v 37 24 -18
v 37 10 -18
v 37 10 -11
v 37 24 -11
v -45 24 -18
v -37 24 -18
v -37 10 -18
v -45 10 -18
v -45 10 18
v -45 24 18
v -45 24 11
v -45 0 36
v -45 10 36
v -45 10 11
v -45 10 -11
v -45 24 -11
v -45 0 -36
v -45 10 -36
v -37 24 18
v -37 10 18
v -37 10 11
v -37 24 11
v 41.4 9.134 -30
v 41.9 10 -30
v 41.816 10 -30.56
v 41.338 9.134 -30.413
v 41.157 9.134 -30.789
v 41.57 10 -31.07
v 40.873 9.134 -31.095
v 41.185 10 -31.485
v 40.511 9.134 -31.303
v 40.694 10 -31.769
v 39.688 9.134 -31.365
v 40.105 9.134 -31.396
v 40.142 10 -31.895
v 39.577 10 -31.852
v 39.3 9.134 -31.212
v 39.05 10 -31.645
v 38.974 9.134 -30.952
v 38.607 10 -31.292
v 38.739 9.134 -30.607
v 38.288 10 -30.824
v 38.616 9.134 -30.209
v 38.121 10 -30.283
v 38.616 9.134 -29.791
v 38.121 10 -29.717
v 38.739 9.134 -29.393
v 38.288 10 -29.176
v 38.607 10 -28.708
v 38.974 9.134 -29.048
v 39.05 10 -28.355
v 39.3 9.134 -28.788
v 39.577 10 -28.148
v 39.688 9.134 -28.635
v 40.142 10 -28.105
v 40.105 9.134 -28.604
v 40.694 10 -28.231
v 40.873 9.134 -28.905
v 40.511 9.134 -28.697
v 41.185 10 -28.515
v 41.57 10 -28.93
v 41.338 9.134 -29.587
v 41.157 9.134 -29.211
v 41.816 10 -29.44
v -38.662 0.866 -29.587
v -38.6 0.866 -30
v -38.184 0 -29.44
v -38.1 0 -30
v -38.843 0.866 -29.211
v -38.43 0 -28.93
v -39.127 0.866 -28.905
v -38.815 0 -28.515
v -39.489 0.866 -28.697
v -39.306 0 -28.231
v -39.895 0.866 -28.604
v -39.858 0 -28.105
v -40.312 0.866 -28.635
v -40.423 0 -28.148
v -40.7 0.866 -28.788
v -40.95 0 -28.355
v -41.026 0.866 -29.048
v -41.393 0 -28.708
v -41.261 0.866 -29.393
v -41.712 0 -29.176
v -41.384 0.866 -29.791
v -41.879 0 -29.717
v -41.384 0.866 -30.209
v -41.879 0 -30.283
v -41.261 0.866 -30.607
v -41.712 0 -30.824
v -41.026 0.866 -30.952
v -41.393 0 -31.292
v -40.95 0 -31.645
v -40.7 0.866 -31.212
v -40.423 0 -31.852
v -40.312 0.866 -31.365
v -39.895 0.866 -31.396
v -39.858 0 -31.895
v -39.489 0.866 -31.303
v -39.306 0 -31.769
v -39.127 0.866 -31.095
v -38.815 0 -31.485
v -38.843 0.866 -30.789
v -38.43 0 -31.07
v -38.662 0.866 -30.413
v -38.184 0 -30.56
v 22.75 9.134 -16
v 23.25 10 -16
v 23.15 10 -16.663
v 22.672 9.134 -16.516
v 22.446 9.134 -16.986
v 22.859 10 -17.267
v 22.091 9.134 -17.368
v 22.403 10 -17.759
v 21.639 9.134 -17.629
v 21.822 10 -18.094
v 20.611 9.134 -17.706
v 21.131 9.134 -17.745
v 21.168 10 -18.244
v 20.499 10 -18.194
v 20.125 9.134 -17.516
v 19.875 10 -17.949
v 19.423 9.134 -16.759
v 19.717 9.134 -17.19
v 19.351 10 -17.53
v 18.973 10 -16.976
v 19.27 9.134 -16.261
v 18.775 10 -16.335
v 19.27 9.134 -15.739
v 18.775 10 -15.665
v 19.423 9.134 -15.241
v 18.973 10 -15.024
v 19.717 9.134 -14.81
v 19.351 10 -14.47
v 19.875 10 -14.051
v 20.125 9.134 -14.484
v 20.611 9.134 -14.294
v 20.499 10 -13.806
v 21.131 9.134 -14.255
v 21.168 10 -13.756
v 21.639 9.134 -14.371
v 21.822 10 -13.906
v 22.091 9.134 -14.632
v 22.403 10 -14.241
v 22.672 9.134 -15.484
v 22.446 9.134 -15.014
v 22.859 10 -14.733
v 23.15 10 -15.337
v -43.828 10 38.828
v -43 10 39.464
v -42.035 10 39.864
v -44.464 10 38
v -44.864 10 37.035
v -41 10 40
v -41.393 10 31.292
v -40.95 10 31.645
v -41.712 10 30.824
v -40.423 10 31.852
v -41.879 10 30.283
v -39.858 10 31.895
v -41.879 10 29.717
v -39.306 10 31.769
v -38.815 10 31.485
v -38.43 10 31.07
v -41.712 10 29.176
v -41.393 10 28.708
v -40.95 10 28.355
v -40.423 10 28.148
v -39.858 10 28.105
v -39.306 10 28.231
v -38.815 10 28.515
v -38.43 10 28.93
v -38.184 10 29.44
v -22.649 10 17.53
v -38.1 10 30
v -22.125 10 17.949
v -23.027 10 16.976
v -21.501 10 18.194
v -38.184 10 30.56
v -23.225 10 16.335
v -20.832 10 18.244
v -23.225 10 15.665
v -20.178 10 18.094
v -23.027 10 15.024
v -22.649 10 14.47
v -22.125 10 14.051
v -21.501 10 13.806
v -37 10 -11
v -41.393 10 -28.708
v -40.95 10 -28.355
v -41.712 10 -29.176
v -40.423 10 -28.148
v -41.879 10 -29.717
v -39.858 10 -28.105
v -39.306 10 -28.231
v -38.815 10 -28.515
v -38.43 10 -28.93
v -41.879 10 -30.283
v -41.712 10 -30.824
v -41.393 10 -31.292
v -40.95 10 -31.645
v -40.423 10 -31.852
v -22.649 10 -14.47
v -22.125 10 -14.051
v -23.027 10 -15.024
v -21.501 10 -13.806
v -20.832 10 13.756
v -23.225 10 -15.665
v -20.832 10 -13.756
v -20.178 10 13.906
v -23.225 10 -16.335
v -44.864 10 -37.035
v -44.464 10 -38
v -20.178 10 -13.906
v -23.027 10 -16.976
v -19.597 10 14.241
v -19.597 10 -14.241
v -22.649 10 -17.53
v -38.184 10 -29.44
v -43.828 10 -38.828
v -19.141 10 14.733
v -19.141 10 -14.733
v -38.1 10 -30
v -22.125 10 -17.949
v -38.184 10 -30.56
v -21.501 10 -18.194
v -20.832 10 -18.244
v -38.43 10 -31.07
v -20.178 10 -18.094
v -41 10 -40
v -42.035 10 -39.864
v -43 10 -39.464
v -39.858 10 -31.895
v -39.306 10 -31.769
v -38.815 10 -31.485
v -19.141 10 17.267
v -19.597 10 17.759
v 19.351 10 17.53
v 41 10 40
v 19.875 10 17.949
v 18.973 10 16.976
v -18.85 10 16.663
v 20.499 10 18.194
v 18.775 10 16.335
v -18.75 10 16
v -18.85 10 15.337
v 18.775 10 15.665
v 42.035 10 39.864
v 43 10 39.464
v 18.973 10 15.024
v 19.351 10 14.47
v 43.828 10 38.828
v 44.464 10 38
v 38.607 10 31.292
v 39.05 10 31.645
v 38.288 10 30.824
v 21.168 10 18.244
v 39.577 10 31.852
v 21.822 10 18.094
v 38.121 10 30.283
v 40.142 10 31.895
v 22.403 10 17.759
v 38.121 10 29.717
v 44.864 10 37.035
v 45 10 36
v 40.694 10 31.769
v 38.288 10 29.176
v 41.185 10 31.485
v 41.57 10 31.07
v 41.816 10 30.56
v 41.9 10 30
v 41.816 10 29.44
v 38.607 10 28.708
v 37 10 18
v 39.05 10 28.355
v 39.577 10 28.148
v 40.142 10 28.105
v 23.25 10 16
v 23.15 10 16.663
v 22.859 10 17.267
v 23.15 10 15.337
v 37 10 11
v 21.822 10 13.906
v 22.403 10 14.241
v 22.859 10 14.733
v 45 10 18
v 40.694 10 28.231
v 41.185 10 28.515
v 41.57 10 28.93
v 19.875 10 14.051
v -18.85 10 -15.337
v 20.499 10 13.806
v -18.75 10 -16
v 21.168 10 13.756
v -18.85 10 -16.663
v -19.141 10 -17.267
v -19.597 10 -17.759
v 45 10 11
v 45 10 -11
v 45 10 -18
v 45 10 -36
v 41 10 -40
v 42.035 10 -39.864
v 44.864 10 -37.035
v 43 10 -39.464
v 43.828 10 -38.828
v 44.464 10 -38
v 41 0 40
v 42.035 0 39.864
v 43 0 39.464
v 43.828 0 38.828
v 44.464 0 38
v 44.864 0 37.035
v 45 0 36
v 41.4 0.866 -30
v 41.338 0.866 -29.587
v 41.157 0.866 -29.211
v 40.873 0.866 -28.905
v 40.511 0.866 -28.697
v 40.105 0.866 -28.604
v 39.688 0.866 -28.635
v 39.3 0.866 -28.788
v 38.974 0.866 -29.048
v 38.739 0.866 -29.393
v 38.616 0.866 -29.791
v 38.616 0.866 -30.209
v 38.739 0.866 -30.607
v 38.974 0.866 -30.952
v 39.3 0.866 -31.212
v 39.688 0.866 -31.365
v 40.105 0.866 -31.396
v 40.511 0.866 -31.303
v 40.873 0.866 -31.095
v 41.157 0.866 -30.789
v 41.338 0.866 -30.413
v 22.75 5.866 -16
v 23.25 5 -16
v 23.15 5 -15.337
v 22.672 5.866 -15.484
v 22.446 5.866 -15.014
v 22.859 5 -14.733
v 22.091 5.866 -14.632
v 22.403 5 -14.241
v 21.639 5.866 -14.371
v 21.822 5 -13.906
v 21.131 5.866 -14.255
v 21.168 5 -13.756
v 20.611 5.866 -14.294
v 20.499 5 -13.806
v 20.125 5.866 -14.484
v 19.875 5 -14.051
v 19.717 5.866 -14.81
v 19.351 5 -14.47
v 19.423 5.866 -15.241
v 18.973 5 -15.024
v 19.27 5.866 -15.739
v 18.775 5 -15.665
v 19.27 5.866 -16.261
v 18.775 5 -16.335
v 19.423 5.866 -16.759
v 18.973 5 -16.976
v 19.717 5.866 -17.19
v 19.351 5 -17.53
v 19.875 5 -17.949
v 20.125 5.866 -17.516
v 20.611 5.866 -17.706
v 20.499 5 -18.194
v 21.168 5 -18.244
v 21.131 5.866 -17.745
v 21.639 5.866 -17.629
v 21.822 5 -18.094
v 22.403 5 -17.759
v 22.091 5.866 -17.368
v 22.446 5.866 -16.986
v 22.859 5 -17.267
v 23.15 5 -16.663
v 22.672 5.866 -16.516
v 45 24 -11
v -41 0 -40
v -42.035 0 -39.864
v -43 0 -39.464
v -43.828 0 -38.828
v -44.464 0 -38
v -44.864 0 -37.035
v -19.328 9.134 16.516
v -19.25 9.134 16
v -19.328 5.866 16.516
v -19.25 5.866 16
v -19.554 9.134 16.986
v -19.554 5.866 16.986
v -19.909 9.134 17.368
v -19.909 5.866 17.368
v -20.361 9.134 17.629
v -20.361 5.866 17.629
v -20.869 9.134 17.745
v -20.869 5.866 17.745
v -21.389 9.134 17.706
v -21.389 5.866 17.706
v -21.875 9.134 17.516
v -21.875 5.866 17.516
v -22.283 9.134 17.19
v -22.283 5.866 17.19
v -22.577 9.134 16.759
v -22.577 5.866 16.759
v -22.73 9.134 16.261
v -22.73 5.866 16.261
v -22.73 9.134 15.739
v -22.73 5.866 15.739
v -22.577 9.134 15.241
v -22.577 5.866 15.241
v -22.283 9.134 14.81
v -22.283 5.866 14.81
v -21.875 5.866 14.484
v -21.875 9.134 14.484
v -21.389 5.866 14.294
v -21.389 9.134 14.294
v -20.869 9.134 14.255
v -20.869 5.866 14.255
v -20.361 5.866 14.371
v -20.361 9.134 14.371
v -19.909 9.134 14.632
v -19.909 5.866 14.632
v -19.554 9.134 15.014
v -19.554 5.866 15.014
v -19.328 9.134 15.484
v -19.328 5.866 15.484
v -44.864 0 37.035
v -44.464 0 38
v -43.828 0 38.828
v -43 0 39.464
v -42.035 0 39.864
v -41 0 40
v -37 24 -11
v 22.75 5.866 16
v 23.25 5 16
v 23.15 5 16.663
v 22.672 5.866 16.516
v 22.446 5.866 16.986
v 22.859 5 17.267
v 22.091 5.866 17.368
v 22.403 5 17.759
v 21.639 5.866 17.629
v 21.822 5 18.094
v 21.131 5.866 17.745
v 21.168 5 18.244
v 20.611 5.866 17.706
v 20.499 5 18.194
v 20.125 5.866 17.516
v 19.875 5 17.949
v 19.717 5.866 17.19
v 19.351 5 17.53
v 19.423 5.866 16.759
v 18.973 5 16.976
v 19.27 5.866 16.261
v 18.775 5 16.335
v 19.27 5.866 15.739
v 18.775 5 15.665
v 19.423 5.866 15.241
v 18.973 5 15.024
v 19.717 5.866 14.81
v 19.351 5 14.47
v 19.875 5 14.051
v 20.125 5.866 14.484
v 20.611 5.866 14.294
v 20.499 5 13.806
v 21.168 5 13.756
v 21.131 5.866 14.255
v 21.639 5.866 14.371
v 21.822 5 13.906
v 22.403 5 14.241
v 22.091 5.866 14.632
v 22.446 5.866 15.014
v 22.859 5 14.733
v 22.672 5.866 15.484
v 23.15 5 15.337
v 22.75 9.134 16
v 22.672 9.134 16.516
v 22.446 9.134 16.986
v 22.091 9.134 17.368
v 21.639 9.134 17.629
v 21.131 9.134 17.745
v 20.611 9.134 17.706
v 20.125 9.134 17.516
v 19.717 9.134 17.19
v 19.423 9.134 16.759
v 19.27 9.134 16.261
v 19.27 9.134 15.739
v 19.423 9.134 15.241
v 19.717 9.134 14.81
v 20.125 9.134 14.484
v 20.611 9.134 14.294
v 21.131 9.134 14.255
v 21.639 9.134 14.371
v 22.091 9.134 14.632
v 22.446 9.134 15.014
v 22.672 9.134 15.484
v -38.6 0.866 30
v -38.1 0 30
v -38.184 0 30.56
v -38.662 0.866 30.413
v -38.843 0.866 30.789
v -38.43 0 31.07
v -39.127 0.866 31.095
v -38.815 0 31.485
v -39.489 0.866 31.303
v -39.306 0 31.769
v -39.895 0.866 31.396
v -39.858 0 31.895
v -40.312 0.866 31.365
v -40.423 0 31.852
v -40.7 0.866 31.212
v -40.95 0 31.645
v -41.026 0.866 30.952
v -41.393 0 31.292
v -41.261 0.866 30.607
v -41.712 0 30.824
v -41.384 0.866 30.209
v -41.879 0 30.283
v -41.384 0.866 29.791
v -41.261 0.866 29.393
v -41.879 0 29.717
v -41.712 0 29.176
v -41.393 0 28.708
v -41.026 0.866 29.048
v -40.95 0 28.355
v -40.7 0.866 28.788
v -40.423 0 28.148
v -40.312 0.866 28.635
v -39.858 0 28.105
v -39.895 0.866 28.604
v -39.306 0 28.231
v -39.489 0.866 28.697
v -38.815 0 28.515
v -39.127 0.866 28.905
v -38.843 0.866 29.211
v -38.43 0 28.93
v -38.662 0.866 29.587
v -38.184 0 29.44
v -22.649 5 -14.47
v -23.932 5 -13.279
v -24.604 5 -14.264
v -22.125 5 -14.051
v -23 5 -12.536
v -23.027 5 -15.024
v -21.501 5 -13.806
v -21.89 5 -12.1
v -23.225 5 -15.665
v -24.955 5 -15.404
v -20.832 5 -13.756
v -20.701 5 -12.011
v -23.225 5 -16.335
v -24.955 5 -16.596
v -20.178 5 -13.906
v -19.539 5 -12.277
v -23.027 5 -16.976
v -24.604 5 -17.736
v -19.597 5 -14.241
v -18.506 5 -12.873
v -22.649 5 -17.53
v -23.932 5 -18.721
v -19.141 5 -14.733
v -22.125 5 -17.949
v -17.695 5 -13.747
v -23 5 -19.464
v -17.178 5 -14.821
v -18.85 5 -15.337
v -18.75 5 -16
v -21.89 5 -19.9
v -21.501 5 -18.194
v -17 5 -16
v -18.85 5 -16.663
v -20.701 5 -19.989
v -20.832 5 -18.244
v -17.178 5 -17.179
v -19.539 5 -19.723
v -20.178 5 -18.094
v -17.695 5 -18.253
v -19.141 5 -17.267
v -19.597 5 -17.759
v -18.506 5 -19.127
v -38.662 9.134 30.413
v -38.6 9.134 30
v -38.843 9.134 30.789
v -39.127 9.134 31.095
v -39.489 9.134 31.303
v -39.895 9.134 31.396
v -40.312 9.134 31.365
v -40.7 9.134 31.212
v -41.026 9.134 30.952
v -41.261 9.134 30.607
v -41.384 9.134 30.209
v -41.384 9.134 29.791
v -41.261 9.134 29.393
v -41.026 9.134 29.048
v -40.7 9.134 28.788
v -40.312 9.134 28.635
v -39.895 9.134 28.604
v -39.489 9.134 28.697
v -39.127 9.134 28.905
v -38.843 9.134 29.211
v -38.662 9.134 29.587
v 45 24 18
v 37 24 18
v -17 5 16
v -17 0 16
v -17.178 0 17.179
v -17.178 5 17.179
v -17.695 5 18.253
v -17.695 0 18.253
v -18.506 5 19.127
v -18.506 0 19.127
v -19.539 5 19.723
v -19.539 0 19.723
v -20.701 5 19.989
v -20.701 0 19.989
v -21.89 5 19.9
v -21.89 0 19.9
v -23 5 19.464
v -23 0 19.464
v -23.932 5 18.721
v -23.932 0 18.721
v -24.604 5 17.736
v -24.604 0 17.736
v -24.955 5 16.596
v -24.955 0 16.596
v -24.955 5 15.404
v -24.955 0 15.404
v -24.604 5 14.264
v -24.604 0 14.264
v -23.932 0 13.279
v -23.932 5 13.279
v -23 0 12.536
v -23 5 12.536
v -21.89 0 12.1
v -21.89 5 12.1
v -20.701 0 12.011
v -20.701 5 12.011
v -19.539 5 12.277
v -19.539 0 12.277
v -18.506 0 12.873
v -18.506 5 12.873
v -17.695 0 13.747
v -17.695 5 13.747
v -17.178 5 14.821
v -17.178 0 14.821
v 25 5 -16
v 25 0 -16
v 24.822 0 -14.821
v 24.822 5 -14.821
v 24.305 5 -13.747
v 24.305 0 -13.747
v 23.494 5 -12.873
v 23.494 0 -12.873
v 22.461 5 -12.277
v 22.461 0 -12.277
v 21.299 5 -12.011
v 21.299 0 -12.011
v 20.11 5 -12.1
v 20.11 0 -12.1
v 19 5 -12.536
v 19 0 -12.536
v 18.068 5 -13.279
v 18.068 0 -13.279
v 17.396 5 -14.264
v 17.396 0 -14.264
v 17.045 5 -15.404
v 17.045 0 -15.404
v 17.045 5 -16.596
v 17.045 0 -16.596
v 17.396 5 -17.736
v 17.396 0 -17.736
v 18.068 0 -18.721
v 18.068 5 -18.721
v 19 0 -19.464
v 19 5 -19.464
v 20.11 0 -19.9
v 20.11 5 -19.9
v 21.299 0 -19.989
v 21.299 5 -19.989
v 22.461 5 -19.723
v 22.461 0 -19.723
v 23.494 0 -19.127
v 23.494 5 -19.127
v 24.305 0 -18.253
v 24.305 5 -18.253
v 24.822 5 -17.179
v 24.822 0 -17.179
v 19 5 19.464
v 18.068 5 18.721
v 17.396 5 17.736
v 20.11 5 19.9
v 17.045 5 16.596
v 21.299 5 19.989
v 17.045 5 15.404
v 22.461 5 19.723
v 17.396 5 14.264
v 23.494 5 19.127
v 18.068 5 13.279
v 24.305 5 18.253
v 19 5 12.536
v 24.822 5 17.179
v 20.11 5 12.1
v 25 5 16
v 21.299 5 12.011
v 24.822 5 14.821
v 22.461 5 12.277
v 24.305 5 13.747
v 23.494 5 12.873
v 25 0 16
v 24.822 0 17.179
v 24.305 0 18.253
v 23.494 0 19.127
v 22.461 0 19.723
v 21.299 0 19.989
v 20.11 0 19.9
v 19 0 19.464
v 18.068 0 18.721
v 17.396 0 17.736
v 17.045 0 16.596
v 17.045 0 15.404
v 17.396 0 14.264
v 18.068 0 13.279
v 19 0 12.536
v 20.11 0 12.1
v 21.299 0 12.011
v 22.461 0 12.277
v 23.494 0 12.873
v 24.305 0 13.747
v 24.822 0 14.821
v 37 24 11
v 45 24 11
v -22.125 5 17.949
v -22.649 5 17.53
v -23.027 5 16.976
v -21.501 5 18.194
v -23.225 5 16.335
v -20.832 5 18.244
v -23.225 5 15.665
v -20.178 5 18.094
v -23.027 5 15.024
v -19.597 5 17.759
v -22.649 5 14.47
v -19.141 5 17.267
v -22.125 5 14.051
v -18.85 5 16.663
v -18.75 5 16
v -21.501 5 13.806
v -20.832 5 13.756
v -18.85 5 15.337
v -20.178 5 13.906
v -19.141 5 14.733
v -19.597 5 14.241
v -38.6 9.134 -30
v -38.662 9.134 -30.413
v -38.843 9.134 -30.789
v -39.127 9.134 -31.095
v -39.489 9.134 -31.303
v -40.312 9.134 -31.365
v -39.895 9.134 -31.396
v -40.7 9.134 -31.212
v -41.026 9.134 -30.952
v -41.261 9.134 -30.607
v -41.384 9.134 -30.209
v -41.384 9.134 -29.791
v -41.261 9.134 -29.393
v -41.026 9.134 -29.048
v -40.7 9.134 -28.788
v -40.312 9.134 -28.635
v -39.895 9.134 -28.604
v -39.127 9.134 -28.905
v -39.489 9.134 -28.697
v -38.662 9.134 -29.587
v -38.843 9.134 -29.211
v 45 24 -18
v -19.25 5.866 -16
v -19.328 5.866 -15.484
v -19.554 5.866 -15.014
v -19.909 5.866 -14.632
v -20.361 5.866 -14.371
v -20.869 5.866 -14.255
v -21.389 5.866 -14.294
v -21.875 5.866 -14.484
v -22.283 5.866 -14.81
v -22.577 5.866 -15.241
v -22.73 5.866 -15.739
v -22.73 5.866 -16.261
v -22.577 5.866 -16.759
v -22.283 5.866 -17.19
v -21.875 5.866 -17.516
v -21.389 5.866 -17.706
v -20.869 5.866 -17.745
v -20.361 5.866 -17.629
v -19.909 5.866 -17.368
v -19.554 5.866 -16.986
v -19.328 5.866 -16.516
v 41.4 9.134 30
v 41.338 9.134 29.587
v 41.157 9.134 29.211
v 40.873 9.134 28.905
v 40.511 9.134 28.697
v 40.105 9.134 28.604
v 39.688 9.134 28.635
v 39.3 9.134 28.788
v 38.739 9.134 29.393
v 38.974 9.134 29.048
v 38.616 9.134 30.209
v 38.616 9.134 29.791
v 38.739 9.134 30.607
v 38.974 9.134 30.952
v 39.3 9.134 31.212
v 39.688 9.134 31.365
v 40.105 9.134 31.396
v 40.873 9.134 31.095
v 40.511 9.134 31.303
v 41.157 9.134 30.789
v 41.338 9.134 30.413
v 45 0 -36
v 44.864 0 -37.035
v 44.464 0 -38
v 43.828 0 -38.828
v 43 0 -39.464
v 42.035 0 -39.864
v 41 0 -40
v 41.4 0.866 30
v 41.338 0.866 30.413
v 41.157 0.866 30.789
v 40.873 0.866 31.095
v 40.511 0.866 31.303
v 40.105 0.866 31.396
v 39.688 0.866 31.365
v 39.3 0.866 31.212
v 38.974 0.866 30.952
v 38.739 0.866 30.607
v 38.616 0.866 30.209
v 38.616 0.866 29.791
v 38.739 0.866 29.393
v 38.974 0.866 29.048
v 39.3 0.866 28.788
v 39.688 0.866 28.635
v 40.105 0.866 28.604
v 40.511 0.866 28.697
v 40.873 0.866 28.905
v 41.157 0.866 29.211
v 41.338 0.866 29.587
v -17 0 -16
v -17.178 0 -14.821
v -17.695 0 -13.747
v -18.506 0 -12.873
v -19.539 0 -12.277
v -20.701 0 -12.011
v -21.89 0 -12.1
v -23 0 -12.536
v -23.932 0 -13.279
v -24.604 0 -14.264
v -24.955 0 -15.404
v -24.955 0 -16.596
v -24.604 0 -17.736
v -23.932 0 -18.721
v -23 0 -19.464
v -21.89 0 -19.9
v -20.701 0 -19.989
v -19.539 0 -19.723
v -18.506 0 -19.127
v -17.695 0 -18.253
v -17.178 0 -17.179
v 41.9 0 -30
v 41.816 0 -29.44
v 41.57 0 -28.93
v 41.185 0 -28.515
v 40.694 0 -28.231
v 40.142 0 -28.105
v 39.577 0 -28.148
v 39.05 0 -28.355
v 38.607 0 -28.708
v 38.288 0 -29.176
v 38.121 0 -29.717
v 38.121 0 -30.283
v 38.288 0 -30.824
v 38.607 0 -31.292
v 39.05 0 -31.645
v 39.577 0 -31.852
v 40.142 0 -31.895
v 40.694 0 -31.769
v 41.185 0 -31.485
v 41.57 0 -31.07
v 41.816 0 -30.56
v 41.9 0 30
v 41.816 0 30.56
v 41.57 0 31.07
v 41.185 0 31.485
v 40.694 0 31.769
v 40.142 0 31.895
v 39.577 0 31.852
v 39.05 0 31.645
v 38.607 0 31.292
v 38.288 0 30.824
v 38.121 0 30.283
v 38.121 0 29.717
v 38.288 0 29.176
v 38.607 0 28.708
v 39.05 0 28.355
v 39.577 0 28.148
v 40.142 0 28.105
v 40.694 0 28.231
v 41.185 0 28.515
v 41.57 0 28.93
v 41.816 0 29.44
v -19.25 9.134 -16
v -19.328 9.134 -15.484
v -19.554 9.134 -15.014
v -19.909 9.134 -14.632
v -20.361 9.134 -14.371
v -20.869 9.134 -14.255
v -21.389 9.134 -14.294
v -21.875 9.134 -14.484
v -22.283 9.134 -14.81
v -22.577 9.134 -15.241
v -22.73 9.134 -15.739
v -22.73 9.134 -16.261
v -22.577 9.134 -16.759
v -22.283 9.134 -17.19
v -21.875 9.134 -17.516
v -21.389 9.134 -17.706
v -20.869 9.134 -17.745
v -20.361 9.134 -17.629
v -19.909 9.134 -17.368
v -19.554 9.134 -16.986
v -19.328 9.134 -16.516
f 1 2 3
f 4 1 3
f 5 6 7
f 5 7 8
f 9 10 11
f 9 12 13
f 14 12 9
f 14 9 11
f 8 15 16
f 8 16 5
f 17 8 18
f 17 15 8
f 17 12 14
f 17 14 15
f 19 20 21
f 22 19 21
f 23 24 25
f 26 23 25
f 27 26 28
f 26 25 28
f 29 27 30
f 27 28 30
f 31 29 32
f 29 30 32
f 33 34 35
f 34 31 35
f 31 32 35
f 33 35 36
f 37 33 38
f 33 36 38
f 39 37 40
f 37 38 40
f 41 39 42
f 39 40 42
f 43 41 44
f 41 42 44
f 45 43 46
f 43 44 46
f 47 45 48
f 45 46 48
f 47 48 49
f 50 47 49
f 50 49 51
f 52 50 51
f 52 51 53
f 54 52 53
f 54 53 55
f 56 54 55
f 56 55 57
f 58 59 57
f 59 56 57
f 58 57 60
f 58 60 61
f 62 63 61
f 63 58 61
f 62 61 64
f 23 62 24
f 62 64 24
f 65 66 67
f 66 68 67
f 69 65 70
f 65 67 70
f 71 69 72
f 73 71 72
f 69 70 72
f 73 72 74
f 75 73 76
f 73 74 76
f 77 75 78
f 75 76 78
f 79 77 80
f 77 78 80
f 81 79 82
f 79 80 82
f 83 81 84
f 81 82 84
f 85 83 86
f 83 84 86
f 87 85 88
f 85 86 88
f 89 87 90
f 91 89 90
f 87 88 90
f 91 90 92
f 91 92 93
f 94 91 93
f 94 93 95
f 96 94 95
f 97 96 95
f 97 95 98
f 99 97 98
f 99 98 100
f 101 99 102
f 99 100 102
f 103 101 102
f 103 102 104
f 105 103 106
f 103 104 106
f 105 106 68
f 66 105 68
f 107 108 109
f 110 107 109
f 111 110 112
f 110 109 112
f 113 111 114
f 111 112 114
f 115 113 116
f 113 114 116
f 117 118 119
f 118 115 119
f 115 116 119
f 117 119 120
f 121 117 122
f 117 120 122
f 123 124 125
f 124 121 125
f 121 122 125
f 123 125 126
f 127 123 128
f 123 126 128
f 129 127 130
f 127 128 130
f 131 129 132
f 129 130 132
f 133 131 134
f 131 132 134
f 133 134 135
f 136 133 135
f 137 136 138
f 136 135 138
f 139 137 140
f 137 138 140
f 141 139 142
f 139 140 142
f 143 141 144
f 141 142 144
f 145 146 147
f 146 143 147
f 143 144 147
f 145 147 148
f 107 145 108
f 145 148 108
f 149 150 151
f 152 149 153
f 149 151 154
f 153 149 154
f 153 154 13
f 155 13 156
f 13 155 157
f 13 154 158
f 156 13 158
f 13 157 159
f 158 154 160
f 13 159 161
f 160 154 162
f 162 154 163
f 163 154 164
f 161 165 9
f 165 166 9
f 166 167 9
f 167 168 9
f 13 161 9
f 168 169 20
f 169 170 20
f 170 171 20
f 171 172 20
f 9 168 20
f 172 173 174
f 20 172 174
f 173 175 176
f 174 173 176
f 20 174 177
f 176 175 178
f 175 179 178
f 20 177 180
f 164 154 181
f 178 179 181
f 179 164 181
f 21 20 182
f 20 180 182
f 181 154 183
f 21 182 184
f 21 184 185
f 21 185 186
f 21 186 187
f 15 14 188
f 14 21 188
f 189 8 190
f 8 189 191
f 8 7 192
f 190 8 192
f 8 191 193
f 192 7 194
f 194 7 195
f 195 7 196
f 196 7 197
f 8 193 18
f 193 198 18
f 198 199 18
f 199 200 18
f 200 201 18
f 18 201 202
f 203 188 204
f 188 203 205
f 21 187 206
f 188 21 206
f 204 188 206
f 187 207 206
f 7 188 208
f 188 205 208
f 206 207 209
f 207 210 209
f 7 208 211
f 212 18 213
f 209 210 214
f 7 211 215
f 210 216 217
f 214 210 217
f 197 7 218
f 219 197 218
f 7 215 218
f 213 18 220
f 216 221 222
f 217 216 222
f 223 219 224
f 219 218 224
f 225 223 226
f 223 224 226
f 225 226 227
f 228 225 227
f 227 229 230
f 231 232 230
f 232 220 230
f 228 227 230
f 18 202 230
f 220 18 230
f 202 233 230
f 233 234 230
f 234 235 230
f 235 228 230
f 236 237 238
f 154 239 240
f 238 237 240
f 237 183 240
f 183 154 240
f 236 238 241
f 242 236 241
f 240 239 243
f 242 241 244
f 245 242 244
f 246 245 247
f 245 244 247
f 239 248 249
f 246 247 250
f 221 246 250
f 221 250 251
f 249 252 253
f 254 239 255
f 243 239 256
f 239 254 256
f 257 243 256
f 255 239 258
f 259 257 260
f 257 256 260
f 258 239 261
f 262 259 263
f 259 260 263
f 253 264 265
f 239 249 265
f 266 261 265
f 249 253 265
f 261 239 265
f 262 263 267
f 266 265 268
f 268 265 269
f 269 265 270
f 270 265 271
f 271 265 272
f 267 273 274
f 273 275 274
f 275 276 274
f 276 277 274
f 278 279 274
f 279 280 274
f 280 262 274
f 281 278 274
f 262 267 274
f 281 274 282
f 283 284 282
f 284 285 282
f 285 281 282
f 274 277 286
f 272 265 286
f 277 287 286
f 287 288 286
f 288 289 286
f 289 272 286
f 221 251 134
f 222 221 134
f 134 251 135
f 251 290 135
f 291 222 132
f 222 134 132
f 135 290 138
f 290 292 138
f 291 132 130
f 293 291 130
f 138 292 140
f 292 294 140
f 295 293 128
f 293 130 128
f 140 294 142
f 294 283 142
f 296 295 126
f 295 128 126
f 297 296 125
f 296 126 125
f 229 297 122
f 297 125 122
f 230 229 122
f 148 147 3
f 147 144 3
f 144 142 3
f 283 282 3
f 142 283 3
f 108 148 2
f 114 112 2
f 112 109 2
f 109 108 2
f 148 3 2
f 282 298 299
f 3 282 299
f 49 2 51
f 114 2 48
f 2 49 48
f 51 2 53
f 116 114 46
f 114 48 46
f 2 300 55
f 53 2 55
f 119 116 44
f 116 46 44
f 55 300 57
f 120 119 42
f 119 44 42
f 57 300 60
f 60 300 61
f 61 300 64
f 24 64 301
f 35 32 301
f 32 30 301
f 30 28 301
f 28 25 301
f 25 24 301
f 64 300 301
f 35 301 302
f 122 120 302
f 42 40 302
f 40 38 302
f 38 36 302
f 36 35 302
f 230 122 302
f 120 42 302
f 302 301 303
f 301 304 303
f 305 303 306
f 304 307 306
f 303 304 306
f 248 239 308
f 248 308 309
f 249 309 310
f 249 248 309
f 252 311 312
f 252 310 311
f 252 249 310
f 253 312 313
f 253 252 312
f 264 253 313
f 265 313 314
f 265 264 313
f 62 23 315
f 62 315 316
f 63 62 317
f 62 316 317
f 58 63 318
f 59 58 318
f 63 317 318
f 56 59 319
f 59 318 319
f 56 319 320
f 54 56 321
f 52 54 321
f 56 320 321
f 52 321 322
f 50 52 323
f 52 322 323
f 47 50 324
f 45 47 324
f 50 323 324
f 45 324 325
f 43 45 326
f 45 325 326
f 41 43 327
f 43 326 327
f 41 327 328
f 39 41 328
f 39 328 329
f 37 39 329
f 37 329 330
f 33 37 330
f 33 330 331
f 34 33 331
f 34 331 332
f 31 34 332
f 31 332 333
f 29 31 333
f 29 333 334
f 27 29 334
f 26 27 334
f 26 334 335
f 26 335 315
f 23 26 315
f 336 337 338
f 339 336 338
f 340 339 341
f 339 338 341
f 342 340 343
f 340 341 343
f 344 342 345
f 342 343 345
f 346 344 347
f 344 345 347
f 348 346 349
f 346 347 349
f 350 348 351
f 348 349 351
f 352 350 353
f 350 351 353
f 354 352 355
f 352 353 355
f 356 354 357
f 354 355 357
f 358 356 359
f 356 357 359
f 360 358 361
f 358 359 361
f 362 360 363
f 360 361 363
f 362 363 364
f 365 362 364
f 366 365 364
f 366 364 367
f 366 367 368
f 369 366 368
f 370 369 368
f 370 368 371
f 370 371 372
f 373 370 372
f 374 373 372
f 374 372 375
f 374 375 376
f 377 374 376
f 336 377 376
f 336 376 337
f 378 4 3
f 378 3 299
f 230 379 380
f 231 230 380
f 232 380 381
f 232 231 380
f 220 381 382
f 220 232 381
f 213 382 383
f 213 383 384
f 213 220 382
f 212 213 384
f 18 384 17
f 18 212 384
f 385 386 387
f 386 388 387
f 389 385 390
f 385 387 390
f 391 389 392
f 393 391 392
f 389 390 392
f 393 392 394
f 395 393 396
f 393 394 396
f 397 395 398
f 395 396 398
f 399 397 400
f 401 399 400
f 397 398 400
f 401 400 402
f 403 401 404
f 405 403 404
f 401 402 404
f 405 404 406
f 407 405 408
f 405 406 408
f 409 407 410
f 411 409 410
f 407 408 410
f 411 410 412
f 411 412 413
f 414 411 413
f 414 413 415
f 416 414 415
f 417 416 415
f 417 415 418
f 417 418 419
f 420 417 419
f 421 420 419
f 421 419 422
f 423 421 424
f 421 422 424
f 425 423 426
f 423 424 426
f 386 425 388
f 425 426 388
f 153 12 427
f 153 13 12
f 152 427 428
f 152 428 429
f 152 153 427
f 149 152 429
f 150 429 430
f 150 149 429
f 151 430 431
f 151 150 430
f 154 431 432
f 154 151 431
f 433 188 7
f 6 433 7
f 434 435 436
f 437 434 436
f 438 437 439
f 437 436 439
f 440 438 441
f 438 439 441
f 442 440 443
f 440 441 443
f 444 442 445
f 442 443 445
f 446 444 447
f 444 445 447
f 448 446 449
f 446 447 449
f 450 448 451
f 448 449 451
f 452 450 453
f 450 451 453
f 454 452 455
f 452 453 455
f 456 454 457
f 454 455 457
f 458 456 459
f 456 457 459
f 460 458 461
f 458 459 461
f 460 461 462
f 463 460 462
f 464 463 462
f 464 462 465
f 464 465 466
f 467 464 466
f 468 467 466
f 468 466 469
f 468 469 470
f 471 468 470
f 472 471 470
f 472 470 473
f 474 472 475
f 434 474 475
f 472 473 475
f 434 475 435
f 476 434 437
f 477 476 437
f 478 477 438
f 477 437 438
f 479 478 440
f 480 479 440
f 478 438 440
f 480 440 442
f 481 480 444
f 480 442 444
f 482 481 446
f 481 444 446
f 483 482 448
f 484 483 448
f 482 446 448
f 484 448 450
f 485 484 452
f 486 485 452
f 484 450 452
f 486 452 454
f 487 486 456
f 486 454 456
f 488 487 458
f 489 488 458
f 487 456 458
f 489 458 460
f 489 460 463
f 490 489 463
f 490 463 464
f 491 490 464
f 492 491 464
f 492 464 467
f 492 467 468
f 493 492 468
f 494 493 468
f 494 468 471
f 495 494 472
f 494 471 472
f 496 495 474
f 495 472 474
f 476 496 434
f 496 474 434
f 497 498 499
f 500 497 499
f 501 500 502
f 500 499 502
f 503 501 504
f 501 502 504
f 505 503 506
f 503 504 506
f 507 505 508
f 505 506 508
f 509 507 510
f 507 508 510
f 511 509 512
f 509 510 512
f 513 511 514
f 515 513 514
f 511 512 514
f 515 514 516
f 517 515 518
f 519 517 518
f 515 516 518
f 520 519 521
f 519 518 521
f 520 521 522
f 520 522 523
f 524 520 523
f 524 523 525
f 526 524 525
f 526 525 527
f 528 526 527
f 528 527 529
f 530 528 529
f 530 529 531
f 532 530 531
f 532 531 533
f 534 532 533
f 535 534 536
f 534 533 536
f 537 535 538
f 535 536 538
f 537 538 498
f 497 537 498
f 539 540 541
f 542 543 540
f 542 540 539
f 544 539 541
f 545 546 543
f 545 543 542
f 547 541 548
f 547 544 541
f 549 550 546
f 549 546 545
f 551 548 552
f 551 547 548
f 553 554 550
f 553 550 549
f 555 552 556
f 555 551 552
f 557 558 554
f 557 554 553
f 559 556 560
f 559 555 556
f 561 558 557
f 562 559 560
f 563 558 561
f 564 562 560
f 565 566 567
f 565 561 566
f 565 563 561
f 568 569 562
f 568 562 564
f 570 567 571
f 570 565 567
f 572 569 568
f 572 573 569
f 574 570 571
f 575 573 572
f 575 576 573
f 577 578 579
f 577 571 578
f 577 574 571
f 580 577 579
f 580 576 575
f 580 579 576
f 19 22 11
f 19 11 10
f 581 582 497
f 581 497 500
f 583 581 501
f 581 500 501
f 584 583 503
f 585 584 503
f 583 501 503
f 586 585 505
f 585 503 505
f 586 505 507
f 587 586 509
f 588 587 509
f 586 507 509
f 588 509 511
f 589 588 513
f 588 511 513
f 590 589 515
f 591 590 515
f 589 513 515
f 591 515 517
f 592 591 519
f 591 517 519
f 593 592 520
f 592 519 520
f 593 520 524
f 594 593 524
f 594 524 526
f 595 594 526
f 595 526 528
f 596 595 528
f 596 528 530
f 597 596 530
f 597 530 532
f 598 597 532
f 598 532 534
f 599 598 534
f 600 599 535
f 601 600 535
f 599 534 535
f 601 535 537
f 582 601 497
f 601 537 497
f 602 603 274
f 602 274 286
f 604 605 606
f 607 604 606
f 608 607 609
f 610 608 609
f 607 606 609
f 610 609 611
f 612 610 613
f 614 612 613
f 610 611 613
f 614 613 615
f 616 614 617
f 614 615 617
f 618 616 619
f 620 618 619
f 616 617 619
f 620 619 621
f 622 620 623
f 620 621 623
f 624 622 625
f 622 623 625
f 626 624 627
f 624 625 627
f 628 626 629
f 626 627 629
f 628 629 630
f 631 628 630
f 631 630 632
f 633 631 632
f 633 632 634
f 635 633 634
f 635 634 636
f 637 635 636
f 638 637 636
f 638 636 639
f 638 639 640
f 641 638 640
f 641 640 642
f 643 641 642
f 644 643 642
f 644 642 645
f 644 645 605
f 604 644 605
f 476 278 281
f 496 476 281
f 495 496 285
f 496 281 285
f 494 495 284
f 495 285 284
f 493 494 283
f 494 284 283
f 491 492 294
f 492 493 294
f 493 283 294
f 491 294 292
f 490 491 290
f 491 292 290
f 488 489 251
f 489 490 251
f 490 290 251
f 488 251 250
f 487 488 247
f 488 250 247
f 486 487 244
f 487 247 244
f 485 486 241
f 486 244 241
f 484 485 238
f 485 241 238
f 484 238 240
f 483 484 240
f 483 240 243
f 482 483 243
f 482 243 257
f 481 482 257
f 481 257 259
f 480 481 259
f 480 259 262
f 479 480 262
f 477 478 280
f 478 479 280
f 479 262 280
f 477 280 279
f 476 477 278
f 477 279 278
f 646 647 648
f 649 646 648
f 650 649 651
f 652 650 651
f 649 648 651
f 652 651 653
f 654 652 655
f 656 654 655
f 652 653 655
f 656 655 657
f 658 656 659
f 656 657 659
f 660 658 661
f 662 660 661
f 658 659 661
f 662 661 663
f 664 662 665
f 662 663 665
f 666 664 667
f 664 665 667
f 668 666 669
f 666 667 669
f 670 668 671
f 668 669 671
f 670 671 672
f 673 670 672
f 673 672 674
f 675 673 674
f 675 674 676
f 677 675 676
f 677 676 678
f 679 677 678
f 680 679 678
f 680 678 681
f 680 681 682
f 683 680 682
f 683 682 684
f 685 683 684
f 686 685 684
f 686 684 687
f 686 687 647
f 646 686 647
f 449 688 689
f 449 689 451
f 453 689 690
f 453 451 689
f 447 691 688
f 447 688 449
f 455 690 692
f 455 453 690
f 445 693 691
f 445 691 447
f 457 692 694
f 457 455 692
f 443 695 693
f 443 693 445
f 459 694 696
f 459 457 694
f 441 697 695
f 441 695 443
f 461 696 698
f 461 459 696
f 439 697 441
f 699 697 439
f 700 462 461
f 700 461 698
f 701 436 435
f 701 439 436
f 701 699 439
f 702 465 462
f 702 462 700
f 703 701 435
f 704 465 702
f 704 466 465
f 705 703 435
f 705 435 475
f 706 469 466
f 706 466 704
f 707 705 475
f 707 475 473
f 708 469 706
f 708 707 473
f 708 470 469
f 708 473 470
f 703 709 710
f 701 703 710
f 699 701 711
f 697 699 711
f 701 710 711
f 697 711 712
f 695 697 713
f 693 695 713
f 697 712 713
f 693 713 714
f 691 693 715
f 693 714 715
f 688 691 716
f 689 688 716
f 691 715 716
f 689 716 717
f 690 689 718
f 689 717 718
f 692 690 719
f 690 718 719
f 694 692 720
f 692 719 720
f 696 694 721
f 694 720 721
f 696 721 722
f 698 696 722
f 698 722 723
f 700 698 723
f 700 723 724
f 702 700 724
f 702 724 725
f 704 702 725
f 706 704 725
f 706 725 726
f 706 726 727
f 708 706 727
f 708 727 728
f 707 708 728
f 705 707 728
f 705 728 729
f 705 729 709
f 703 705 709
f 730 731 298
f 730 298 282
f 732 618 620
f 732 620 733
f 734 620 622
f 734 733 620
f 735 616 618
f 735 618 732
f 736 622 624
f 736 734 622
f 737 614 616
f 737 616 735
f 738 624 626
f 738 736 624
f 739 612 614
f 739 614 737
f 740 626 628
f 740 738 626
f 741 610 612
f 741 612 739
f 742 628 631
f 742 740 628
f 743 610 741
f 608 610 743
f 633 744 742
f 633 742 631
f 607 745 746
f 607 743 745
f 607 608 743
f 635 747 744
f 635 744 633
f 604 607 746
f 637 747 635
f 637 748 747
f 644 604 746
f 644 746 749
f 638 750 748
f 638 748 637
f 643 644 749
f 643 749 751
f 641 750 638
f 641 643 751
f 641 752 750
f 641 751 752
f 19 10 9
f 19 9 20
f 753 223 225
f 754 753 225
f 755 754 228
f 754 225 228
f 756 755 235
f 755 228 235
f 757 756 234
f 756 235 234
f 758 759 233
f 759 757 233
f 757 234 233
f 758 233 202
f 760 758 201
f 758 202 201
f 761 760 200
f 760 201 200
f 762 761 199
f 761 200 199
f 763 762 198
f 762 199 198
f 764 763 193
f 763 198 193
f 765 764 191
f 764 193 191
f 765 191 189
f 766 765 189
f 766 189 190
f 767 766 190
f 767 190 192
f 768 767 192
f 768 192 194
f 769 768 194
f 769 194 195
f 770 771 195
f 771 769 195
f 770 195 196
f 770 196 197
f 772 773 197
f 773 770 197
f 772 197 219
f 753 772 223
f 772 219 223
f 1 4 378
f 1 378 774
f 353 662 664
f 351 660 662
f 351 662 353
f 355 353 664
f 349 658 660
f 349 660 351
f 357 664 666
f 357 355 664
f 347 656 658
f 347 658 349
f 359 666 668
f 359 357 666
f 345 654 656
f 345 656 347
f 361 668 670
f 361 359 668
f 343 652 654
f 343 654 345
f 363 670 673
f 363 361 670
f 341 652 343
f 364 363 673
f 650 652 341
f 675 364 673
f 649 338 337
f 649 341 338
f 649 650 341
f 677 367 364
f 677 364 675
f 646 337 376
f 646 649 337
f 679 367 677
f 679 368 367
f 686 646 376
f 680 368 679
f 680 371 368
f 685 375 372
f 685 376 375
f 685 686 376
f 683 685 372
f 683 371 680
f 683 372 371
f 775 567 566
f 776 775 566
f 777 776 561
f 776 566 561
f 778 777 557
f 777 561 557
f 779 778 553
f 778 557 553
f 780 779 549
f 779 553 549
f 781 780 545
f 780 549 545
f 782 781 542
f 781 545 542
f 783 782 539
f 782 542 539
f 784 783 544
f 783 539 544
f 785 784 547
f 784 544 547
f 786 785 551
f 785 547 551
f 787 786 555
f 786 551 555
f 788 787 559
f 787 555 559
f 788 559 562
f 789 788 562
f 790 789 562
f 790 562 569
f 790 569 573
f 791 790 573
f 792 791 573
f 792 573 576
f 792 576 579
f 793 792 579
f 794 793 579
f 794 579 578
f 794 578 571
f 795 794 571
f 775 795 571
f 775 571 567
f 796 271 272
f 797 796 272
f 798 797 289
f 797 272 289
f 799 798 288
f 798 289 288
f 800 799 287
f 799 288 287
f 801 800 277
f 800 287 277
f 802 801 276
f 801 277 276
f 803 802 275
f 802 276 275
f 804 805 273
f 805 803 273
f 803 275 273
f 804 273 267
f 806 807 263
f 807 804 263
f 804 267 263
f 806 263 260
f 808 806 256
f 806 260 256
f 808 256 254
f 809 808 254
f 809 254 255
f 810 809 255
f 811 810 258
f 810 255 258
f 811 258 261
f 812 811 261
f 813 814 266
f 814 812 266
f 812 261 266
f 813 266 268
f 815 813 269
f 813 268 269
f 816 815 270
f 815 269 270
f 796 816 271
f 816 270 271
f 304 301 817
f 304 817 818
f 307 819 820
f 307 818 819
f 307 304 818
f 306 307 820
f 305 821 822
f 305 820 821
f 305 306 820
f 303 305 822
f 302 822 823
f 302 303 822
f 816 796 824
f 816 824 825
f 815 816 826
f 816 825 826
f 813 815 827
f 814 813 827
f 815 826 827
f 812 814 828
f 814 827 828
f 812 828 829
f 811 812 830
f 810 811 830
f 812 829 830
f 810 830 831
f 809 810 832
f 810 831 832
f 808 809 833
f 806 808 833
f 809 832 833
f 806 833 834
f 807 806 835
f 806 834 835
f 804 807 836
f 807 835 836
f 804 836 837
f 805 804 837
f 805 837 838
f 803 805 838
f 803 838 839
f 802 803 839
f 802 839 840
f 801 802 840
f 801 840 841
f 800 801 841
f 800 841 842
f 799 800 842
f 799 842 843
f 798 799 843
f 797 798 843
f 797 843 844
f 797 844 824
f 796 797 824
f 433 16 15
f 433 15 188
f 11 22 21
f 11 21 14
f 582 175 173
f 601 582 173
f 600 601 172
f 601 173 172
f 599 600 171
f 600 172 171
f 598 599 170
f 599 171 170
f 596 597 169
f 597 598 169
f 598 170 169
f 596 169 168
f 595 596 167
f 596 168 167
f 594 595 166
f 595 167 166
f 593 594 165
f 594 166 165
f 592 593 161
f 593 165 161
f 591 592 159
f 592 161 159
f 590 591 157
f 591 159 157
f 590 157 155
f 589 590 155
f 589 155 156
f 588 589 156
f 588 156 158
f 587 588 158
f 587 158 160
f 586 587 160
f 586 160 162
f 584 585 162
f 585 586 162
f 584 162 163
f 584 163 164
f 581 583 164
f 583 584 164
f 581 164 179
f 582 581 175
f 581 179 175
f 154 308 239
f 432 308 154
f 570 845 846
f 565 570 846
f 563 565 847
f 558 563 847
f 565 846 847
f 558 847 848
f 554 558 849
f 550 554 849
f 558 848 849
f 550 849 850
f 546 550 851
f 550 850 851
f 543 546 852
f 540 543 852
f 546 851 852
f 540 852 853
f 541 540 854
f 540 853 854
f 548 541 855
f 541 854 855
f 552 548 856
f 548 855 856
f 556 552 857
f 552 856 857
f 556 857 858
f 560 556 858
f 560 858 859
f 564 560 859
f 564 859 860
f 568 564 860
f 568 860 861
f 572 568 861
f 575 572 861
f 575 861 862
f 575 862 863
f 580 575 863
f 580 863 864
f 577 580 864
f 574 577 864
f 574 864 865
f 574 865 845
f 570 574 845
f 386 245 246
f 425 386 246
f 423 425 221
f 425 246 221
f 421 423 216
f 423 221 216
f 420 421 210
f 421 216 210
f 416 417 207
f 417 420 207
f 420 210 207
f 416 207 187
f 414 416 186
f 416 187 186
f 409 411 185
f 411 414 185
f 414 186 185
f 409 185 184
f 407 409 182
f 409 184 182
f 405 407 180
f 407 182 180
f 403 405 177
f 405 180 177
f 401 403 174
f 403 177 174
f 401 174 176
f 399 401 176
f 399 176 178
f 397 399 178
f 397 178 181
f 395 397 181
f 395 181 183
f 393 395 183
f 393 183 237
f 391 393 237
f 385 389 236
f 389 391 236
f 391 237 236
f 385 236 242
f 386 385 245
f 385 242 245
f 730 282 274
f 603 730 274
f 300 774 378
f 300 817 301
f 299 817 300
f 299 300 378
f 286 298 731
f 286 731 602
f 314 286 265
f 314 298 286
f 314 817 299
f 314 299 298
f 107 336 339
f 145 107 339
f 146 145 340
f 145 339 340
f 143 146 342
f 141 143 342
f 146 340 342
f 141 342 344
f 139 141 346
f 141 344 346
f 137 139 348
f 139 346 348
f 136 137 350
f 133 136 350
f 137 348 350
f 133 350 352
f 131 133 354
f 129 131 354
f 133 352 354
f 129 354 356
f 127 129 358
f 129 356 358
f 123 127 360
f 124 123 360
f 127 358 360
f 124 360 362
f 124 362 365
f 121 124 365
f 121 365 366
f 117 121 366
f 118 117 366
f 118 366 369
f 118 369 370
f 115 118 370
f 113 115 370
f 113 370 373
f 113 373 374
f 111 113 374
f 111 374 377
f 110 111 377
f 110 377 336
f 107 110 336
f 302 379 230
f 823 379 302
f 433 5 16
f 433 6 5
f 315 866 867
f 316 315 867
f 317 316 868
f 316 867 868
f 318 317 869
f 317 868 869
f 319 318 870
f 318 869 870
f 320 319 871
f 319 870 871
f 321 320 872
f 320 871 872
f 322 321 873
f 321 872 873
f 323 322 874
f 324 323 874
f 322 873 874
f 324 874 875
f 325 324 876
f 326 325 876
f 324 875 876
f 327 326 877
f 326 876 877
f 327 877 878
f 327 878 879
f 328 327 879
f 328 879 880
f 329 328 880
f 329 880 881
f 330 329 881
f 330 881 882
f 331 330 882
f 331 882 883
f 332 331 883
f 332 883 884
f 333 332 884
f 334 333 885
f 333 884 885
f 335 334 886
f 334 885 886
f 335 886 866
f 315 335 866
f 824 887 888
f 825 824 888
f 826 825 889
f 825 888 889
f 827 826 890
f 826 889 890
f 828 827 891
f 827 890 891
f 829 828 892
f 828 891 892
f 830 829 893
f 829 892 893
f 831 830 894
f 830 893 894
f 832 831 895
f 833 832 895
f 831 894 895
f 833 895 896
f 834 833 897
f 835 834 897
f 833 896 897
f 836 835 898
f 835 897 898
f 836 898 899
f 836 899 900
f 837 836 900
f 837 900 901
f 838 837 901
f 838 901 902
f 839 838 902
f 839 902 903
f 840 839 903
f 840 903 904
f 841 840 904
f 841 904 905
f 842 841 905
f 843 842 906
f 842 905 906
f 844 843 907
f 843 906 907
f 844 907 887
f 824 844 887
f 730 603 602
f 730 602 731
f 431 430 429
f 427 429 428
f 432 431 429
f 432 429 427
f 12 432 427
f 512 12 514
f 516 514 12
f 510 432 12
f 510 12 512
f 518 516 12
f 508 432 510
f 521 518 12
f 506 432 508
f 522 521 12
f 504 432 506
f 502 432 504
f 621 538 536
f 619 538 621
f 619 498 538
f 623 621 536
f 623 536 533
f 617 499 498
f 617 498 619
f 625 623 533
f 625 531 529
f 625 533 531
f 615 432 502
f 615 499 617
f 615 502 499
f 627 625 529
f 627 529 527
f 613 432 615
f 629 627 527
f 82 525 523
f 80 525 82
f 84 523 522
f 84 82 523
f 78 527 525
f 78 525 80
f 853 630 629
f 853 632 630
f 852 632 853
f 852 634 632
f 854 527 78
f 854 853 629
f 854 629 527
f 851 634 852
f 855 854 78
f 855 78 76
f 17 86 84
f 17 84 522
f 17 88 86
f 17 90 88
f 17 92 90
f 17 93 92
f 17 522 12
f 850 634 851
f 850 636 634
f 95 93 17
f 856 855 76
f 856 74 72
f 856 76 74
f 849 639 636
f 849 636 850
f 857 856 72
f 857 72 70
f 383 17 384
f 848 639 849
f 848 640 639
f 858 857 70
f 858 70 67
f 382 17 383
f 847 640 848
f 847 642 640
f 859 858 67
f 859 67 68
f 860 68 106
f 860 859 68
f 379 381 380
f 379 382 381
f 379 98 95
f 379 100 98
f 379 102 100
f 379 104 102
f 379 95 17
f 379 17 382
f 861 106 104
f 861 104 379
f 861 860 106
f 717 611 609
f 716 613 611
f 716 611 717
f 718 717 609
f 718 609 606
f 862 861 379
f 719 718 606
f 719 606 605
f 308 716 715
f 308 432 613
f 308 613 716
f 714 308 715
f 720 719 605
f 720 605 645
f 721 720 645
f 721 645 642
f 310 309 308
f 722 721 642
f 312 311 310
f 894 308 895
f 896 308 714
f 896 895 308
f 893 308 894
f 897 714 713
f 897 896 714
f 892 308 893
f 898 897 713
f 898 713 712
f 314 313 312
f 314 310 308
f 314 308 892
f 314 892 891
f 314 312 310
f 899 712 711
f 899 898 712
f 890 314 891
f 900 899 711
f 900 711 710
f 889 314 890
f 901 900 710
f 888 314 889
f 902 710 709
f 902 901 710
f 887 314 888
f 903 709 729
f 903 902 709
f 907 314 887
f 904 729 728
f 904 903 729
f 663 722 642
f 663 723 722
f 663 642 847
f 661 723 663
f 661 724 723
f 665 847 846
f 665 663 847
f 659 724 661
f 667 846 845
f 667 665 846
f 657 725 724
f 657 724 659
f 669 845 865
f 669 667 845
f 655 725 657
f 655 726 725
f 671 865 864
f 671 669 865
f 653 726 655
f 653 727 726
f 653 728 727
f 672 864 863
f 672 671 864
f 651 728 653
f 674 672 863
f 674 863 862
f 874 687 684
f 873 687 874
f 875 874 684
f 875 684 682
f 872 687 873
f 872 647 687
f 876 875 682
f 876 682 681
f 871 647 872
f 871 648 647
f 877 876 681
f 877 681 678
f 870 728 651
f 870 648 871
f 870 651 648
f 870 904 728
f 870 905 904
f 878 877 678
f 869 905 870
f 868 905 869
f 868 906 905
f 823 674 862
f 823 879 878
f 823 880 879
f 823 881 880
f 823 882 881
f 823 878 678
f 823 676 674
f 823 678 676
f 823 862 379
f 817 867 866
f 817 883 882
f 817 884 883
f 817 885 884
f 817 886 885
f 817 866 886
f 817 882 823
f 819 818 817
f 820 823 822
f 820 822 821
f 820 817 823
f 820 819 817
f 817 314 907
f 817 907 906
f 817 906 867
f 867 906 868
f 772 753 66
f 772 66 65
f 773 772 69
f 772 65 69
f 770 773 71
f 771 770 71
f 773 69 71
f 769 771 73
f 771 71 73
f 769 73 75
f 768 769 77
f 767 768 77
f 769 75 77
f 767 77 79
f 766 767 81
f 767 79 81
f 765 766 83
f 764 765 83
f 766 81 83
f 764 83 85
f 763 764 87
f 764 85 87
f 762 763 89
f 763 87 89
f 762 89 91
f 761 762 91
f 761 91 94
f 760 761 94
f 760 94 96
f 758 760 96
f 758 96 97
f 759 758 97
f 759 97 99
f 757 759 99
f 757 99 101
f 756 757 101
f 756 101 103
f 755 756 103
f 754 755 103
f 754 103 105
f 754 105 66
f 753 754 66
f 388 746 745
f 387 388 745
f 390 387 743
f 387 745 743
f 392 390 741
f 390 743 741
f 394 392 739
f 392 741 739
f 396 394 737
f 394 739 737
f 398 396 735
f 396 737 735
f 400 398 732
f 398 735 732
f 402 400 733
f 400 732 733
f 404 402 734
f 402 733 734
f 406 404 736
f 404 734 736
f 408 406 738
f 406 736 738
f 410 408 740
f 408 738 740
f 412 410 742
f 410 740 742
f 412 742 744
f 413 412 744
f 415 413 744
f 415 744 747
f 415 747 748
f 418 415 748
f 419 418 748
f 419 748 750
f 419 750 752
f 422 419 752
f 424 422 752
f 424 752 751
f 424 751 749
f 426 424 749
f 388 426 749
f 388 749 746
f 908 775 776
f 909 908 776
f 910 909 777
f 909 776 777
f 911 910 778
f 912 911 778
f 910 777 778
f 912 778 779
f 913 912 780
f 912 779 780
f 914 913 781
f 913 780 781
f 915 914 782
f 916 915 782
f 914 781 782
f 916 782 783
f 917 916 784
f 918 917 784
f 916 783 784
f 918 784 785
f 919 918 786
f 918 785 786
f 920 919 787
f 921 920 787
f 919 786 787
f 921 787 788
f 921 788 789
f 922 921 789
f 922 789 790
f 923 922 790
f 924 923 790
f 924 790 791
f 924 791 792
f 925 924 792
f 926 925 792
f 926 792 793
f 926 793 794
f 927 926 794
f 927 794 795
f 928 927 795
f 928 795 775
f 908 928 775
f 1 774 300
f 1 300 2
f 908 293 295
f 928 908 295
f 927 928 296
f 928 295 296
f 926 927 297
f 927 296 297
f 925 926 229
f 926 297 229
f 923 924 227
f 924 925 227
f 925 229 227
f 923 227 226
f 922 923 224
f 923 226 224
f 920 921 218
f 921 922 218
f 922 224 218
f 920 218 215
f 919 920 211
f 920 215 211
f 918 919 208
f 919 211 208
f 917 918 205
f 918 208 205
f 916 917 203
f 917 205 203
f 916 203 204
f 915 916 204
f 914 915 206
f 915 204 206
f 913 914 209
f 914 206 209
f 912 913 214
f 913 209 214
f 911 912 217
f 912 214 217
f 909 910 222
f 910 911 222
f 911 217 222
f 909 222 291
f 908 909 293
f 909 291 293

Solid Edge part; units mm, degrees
sketch "Sketch1" plane through (0, 0, 0) normal (0, -1, 0) x (1, 0, 0)
  line L0 (-45, -40) -> (45, -40)
  line L1 (45, -40) -> (45, 40)
  line L2 (45, 40) -> (-45, 40)
  line L3 (-45, 40) -> (-45, -40)
  dimension "D1" = 90
  dimension "D2" = 80
extrude "Protrusion1" add sketch "Sketch1" against normal blind 10
sketch "Sketch2" plane through (0, 0, 0) normal (0, -1, 0) x (1, 0, 0)
  circle A0 centre (-40, 30) radius 1.4
  circle A1 centre (-40, -30) radius 1.4
  circle A2 centre (40, -30) radius 1.4
  circle A3 centre (40, 30) radius 1.4
  dimension "D1" = 2.8
  dimension "D2" = 60
  dimension "D3" = 80
extrude "Cutout1" cut sketch "Sketch2" against normal through all
sketch "Sketch3" plane through (0, 0, 0) normal (0, -1, 0) x (1, 0, 0)
  circle A0 centre (-21, 16) radius 4
  circle A1 centre (-21, -16) radius 4
  circle A2 centre (21, -16) radius 4
  circle A3 centre (21, 16) radius 4
extrude "Extrusionsausschnitt_2" cut sketch "Sketch3" against normal blind 5
sketch "Sketch4" plane through (0, 0, 0) normal (0, -1, 0) x (1, 0, 0)
  circle A0 centre (-21, 16) radius 1.75
  circle A1 centre (-21, -16) radius 1.75
  circle A2 centre (21, -16) radius 1.75
  circle A3 centre (21, 16) radius 1.75
  dimension "D1" = 3.5
extrude "Cutout2" cut sketch "Sketch4" against normal through all
fillet "Verrundung_1" radius 4 4 edges at (-45, 5, 40) (45, 5, 40) (45, 5, -40) (-45, 5, -40)
chamfer "Fase_1" distance 0.5 angle 60 4 edges at (38.6, 0, 30) (-41.4, 0, 30) (-41.4, 0, -30) (38.6, 0, -30) measured on face at (-29.1, 0, 27.4667)
chamfer "Fase_2" distance 0.5 angle 60 4 edges at (-40, 10, 31.4) (40, 10, 31.4) (40, 10, -28.6) (-40, 10, -28.6) measured on face at (-29.1, 10, 27.4667)
chamfer "Fase_3" distance 0.5 angle 60 4 edges at (-21, 10, 17.75) (21, 10, 17.75) (-21, 10, -14.25) (21, 10, -14.25) measured on face at (-29.1, 10, 27.4667)
chamfer "Fase_4" distance 0.5 angle 60 4 edges at (-21, 5, 14.25) (-21, 5, -17.75) (21, 5, 14.25) (21, 5, -17.75) measured on face at (-23.5867, 5, 18.7467) measured on face at (18.4133, 5, 18.7467) measured on face at (-23.5867, 5, -13.2533) measured on face at (18.4133, 5, -13.2533)
sketch "Sketch5" plane through (0, 10, 0) normal (0, 1, 0) x (1, 0, 0)
  line L0 (-45, 11) -> (-37, 11)
  line L1 (-37, 11) -> (-37, 18)
  line L2 (-37, 18) -> (-45, 18)
  line L3 (-45, 18) -> (-45, 11)
  dimension "D1" = 11
  dimension "D2" = 8
  dimension "D3" = 18
extrude "Extrusionsausprägung_2" add sketch "Sketch5" along normal blind 14
mirror "Mirror1" about plane through (0, 0, 0) normal (0, 0, 1) of "Extrusionsausprägung_2"
mirror "Mirror2" about plane through (0, 0, 0) normal (1, 0, 0) of "Extrusionsausprägung_2", "Mirror1"
properties material "Nylon, allgemein"
